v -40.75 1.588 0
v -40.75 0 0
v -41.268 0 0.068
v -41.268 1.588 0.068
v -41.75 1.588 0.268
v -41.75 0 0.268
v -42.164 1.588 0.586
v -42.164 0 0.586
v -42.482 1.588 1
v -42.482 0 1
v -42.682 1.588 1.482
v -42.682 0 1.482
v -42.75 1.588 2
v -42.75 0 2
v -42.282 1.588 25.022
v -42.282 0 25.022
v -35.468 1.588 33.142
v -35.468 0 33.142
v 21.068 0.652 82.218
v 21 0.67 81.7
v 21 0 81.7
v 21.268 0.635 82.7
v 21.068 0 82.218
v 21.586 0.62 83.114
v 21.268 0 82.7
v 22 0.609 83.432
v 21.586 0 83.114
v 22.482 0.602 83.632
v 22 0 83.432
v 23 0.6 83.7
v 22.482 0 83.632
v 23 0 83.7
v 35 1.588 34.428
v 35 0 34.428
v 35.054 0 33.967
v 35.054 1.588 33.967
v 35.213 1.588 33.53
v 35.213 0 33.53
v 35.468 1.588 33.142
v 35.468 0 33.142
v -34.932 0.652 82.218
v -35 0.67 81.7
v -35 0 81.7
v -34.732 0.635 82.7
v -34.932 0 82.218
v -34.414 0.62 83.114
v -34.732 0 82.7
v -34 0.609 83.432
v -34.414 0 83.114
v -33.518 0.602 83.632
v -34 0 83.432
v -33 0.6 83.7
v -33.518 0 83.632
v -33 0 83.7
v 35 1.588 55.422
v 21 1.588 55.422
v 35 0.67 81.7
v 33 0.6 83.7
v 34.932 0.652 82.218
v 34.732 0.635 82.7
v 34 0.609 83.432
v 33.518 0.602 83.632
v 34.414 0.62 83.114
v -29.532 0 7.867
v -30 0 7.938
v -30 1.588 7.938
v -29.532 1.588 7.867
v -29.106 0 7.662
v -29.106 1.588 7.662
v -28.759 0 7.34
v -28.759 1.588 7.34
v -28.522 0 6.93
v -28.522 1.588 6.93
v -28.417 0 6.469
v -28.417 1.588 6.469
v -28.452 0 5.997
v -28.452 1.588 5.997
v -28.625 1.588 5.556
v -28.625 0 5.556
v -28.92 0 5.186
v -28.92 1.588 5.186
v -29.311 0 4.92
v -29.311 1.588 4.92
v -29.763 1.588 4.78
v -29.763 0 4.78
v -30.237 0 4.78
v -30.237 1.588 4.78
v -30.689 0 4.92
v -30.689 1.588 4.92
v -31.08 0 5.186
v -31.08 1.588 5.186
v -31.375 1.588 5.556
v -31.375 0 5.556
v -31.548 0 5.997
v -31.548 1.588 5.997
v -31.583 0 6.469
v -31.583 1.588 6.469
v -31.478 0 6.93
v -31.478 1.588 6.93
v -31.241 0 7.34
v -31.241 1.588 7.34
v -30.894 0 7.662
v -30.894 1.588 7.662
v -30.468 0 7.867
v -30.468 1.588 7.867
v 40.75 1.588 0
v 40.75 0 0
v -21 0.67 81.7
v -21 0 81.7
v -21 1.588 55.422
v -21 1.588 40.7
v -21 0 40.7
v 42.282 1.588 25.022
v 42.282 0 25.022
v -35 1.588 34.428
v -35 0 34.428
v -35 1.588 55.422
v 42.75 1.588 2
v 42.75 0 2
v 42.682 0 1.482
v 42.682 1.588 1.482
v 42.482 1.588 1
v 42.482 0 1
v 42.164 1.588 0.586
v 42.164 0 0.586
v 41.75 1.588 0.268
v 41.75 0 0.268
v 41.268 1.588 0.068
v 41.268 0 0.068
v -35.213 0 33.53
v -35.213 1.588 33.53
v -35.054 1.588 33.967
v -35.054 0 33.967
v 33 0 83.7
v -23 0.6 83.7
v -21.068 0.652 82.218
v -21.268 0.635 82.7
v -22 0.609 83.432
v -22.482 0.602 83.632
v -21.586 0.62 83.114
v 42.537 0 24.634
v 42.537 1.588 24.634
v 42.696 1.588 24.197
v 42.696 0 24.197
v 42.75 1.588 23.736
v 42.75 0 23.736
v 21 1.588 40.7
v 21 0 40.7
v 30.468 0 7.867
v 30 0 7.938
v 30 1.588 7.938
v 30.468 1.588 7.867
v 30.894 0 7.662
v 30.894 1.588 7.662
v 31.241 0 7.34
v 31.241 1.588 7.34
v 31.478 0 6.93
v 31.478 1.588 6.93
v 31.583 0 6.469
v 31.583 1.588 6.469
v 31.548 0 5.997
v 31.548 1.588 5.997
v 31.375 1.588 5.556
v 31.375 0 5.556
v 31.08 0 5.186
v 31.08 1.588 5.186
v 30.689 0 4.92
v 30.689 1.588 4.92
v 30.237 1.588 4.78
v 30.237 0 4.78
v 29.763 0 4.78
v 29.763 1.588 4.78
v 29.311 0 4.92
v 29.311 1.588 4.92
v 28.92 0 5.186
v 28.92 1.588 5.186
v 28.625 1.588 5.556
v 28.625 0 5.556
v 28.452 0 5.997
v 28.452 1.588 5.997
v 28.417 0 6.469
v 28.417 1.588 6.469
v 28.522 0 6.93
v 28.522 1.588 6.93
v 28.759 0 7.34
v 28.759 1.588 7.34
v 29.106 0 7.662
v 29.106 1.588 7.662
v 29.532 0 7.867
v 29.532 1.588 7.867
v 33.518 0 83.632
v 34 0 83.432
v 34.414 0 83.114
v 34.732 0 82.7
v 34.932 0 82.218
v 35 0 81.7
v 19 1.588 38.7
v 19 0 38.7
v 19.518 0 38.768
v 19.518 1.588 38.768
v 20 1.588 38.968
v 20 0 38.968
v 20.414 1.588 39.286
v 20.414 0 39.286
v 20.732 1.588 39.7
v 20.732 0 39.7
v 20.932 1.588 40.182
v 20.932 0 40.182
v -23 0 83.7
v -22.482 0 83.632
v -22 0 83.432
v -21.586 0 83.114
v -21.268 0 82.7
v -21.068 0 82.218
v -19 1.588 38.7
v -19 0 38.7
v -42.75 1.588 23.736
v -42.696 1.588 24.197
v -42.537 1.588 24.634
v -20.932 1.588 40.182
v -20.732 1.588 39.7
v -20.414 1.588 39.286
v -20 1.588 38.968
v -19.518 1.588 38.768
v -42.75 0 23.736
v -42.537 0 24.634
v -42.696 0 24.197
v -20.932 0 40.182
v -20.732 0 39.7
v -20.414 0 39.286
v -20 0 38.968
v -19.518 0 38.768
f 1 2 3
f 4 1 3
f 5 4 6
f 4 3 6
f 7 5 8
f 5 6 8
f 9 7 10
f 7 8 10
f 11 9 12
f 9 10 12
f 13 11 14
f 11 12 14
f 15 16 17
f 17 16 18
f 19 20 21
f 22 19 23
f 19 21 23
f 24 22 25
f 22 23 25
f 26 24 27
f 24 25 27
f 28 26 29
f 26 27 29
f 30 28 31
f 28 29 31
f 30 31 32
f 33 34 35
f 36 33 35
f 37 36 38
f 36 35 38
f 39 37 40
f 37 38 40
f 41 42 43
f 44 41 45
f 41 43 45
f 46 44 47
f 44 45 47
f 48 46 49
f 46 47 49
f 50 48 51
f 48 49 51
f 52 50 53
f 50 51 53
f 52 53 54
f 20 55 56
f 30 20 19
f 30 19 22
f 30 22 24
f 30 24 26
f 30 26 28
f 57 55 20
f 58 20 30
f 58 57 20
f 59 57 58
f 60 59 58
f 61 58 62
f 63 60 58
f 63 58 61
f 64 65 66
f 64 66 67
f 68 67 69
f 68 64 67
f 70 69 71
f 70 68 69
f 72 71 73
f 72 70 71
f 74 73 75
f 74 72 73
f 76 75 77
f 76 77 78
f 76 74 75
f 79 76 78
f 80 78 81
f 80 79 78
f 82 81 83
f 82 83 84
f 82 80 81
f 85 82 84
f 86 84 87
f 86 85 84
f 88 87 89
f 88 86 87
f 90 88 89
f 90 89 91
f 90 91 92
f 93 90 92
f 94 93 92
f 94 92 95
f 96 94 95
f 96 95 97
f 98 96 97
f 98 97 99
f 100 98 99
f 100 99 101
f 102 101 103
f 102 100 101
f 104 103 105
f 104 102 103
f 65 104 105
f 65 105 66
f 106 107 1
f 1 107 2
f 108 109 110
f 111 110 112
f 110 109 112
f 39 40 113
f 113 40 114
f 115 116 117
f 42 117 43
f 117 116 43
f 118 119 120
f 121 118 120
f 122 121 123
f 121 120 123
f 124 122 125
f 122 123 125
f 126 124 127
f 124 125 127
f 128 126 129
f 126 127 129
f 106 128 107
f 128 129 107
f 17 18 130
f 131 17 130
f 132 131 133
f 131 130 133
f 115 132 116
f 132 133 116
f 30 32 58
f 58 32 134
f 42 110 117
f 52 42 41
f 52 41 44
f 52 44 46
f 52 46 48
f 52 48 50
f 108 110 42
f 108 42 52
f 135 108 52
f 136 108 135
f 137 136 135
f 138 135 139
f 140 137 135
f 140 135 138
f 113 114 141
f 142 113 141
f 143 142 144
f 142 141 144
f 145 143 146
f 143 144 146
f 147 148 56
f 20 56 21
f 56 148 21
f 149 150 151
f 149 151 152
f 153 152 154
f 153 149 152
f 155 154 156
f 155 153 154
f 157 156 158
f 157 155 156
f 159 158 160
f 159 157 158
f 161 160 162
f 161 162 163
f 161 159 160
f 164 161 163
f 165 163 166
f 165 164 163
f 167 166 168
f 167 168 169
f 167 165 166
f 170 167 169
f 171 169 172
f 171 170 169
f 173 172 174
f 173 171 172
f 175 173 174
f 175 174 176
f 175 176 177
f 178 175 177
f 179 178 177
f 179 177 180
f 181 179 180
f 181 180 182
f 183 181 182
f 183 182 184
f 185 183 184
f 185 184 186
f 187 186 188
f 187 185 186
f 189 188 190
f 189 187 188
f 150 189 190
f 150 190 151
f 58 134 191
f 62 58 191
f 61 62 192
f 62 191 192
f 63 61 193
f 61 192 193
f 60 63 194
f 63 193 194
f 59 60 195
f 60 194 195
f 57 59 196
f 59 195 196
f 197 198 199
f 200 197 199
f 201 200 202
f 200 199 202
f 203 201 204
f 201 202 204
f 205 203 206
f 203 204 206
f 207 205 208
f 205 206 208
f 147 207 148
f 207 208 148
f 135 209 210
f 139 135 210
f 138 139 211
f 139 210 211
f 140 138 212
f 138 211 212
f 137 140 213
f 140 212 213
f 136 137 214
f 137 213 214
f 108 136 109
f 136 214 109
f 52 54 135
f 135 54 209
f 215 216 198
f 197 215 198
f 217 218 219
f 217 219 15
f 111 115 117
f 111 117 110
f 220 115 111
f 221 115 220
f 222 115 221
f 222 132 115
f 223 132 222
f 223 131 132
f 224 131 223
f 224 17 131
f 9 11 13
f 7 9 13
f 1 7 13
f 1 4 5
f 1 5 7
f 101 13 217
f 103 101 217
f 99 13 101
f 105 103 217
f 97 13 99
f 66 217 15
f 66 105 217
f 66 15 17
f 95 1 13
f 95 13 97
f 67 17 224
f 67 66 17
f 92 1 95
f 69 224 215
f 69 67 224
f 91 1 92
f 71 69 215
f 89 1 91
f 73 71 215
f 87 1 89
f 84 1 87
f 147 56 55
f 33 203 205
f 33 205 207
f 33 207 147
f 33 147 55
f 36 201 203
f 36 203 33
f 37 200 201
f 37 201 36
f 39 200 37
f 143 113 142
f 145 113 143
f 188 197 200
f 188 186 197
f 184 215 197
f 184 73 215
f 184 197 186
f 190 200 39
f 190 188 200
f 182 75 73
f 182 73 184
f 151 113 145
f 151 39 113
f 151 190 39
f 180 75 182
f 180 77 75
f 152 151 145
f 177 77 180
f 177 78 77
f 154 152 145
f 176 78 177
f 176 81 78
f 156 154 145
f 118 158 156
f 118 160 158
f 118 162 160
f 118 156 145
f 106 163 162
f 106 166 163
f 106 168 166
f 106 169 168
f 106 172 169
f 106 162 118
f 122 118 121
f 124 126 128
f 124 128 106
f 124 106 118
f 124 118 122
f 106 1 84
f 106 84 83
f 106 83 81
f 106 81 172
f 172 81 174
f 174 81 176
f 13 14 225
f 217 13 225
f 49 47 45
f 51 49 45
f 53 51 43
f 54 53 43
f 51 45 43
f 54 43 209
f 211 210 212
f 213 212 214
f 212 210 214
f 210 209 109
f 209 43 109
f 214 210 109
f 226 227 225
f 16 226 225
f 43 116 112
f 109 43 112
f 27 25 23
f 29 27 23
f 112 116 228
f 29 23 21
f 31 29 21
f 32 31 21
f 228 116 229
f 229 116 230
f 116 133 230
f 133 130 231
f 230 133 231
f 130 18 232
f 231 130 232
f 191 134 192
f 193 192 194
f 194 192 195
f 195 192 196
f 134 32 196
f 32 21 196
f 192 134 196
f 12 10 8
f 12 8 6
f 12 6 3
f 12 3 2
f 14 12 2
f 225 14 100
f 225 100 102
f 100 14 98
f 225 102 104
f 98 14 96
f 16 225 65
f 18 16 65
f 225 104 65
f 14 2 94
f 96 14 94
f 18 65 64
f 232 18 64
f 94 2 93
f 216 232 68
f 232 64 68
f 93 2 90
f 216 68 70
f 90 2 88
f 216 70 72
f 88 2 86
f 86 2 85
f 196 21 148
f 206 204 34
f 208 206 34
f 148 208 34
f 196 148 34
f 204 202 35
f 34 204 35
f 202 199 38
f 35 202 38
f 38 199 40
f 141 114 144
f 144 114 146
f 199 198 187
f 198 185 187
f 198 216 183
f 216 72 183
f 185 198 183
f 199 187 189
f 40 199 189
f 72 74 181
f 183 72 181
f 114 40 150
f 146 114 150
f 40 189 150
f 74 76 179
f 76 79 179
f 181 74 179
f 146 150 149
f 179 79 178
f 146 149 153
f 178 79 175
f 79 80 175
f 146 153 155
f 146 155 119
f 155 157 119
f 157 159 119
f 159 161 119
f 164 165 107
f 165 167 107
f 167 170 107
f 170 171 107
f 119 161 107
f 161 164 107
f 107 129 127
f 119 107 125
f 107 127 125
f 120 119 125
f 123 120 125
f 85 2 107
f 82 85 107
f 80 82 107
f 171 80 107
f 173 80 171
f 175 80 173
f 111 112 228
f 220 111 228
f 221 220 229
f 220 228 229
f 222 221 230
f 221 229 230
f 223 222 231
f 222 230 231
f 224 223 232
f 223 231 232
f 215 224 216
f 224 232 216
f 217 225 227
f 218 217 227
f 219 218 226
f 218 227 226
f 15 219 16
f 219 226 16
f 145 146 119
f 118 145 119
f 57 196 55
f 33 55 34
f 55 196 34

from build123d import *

# Parameters (mm, degrees)
SKETCH1_R           = 1.5875
BOSS_EXTRUDE1_DEPTH = 1.5875
CUT_EXTRUDE2_DEPTH  = 116.621246561


with BuildPart() as part:
    # Sketch1 → Boss-Extrude1 (new body)
    with BuildSketch(Plane(origin=(0, 0, 0), x_dir=(1, 0, 0), z_dir=(0, 1, 0))):
        with BuildLine():
            Line((-35, -34.427940469), (-35, -81.7))
            ThreePointArc((-35, -81.7), (-34.414213562, -83.114213562), (-33, -83.7))
            Line((-33, -83.7), (-23, -83.7))
            ThreePointArc((-23, -83.7), (-21.585786438, -83.114213562), (-21, -81.7))
            Line((-21, -81.7), (-21, -40.7))
            ThreePointArc((-21, -40.7), (-20.414213562, -39.285786438), (-19, -38.7))
            Line((-19, -38.7), (19, -38.7))
            ThreePointArc((19, -38.7), (20.414213562, -39.285786438), (21, -40.7))
            Line((21, -40.7), (21, -81.7))
            ThreePointArc((21, -81.7), (21.585786438, -83.114213562), (23, -83.7))
            Line((23, -83.7), (33, -83.7))
            ThreePointArc((33, -83.7), (34.414213562, -83.114213562), (35, -81.7))
            Line((35, -81.7), (35, -34.427940469))
            ThreePointArc((35, -34.427940469), (35.120614758, -33.743900182), (35.467911114, -33.142365249))
            Line((35.467911114, -33.142365249), (42.282088886, -25.021544408))
            ThreePointArc((42.282088886, -25.021544408), (42.629385242, -24.420009476), (42.75, -23.735969189))
            Line((42.75, -23.735969189), (42.75, -2))
            ThreePointArc((42.75, -2), (42.164213562, -0.585786438), (40.75, 0))
            Line((40.75, 0), (-40.75, 0))
            ThreePointArc((-40.75, 0), (-42.164213562, -0.585786438), (-42.75, -2))
            Line((-42.75, -2), (-42.75, -23.735969189))
            ThreePointArc((-42.75, -23.735969189), (-42.629385242, -24.420009476), (-42.282088886, -25.021544408))
            Line((-42.282088886, -25.021544408), (-35.467911114, -33.142365249))
            ThreePointArc((-35.467911114, -33.142365249), (-35.120614758, -33.743900182), (-35, -34.427940469))
        make_face()
        with Locations(Location((-30, -6.35, 0), (0, 0, 270))):
            Circle(SKETCH1_R, mode=Mode.SUBTRACT)
        with Locations(Location((30, -6.35, 0), (0, 0, 270))):
            Circle(SKETCH1_R, mode=Mode.SUBTRACT)
    extrude(amount=BOSS_EXTRUDE1_DEPTH)

    # Sketch3 → Cut-Extrude2 (cut, through all)
    with BuildSketch(Plane(origin=(37, 0, 0), x_dir=(0, 0, -1), z_dir=(1, 0, 0))):
        Polygon((-81.7, 1.5875), (-55.421699883, 1.5875), (-83.7, 0.6), (-83.7, 1.5875), align=None)
    extrude(amount=-CUT_EXTRUDE2_DEPTH, mode=Mode.SUBTRACT)


solid = part.part
